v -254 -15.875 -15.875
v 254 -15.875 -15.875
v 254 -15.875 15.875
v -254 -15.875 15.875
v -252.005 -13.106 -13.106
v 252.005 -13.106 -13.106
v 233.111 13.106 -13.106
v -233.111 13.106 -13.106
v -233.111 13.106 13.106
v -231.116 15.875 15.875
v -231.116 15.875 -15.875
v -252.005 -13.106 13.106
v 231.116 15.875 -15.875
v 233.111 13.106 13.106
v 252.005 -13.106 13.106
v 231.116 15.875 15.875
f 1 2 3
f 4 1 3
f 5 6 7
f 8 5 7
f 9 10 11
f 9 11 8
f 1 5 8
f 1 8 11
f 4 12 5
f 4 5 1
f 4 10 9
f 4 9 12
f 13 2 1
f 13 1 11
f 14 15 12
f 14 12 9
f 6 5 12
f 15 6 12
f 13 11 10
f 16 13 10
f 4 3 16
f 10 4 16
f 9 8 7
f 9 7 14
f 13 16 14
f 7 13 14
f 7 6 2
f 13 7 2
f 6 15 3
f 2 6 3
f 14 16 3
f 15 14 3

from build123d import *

# Parameters (mm, degrees)
SKETCH_W       = 31.75
SKETCH_H       = 31.75
SKETCH_W_2     = 26.2128
SKETCH_H_2     = 26.2128
PAD_DEPTH      = 254
PAD_DEPTH_BACK = 254
POCKET_DEPTH   = 31.75


with BuildPart() as part:
    # Sketch → Pad (new body, two sides)
    with BuildSketch(Plane.YZ) as pad_sk:
        Rectangle(SKETCH_W, SKETCH_H)
        Rectangle(SKETCH_W_2, SKETCH_H_2, mode=Mode.SUBTRACT)
    extrude(amount=PAD_DEPTH)
    extrude(pad_sk.sketch, amount=-PAD_DEPTH_BACK)

    # Sketch002 → Pocket (cut)
    with BuildSketch(Plane(origin=(0, 0, 15.875), x_dir=(0, -1, 0), z_dir=(0, 0, 1))):
        Polygon((15.875, -254), (-15.875, -254), (-15.875, -231.115916), align=None)
    pocket = extrude(amount=-POCKET_DEPTH, mode=Mode.SUBTRACT)

    # Mirrored: Pocket across Sketch002 H_Axis
    add(pocket.mirror(Plane(origin=(0, 0, 15.875), x_dir=(0, 0, 1), z_dir=(1, 0, 0))), mode=Mode.SUBTRACT)


solid = part.part
